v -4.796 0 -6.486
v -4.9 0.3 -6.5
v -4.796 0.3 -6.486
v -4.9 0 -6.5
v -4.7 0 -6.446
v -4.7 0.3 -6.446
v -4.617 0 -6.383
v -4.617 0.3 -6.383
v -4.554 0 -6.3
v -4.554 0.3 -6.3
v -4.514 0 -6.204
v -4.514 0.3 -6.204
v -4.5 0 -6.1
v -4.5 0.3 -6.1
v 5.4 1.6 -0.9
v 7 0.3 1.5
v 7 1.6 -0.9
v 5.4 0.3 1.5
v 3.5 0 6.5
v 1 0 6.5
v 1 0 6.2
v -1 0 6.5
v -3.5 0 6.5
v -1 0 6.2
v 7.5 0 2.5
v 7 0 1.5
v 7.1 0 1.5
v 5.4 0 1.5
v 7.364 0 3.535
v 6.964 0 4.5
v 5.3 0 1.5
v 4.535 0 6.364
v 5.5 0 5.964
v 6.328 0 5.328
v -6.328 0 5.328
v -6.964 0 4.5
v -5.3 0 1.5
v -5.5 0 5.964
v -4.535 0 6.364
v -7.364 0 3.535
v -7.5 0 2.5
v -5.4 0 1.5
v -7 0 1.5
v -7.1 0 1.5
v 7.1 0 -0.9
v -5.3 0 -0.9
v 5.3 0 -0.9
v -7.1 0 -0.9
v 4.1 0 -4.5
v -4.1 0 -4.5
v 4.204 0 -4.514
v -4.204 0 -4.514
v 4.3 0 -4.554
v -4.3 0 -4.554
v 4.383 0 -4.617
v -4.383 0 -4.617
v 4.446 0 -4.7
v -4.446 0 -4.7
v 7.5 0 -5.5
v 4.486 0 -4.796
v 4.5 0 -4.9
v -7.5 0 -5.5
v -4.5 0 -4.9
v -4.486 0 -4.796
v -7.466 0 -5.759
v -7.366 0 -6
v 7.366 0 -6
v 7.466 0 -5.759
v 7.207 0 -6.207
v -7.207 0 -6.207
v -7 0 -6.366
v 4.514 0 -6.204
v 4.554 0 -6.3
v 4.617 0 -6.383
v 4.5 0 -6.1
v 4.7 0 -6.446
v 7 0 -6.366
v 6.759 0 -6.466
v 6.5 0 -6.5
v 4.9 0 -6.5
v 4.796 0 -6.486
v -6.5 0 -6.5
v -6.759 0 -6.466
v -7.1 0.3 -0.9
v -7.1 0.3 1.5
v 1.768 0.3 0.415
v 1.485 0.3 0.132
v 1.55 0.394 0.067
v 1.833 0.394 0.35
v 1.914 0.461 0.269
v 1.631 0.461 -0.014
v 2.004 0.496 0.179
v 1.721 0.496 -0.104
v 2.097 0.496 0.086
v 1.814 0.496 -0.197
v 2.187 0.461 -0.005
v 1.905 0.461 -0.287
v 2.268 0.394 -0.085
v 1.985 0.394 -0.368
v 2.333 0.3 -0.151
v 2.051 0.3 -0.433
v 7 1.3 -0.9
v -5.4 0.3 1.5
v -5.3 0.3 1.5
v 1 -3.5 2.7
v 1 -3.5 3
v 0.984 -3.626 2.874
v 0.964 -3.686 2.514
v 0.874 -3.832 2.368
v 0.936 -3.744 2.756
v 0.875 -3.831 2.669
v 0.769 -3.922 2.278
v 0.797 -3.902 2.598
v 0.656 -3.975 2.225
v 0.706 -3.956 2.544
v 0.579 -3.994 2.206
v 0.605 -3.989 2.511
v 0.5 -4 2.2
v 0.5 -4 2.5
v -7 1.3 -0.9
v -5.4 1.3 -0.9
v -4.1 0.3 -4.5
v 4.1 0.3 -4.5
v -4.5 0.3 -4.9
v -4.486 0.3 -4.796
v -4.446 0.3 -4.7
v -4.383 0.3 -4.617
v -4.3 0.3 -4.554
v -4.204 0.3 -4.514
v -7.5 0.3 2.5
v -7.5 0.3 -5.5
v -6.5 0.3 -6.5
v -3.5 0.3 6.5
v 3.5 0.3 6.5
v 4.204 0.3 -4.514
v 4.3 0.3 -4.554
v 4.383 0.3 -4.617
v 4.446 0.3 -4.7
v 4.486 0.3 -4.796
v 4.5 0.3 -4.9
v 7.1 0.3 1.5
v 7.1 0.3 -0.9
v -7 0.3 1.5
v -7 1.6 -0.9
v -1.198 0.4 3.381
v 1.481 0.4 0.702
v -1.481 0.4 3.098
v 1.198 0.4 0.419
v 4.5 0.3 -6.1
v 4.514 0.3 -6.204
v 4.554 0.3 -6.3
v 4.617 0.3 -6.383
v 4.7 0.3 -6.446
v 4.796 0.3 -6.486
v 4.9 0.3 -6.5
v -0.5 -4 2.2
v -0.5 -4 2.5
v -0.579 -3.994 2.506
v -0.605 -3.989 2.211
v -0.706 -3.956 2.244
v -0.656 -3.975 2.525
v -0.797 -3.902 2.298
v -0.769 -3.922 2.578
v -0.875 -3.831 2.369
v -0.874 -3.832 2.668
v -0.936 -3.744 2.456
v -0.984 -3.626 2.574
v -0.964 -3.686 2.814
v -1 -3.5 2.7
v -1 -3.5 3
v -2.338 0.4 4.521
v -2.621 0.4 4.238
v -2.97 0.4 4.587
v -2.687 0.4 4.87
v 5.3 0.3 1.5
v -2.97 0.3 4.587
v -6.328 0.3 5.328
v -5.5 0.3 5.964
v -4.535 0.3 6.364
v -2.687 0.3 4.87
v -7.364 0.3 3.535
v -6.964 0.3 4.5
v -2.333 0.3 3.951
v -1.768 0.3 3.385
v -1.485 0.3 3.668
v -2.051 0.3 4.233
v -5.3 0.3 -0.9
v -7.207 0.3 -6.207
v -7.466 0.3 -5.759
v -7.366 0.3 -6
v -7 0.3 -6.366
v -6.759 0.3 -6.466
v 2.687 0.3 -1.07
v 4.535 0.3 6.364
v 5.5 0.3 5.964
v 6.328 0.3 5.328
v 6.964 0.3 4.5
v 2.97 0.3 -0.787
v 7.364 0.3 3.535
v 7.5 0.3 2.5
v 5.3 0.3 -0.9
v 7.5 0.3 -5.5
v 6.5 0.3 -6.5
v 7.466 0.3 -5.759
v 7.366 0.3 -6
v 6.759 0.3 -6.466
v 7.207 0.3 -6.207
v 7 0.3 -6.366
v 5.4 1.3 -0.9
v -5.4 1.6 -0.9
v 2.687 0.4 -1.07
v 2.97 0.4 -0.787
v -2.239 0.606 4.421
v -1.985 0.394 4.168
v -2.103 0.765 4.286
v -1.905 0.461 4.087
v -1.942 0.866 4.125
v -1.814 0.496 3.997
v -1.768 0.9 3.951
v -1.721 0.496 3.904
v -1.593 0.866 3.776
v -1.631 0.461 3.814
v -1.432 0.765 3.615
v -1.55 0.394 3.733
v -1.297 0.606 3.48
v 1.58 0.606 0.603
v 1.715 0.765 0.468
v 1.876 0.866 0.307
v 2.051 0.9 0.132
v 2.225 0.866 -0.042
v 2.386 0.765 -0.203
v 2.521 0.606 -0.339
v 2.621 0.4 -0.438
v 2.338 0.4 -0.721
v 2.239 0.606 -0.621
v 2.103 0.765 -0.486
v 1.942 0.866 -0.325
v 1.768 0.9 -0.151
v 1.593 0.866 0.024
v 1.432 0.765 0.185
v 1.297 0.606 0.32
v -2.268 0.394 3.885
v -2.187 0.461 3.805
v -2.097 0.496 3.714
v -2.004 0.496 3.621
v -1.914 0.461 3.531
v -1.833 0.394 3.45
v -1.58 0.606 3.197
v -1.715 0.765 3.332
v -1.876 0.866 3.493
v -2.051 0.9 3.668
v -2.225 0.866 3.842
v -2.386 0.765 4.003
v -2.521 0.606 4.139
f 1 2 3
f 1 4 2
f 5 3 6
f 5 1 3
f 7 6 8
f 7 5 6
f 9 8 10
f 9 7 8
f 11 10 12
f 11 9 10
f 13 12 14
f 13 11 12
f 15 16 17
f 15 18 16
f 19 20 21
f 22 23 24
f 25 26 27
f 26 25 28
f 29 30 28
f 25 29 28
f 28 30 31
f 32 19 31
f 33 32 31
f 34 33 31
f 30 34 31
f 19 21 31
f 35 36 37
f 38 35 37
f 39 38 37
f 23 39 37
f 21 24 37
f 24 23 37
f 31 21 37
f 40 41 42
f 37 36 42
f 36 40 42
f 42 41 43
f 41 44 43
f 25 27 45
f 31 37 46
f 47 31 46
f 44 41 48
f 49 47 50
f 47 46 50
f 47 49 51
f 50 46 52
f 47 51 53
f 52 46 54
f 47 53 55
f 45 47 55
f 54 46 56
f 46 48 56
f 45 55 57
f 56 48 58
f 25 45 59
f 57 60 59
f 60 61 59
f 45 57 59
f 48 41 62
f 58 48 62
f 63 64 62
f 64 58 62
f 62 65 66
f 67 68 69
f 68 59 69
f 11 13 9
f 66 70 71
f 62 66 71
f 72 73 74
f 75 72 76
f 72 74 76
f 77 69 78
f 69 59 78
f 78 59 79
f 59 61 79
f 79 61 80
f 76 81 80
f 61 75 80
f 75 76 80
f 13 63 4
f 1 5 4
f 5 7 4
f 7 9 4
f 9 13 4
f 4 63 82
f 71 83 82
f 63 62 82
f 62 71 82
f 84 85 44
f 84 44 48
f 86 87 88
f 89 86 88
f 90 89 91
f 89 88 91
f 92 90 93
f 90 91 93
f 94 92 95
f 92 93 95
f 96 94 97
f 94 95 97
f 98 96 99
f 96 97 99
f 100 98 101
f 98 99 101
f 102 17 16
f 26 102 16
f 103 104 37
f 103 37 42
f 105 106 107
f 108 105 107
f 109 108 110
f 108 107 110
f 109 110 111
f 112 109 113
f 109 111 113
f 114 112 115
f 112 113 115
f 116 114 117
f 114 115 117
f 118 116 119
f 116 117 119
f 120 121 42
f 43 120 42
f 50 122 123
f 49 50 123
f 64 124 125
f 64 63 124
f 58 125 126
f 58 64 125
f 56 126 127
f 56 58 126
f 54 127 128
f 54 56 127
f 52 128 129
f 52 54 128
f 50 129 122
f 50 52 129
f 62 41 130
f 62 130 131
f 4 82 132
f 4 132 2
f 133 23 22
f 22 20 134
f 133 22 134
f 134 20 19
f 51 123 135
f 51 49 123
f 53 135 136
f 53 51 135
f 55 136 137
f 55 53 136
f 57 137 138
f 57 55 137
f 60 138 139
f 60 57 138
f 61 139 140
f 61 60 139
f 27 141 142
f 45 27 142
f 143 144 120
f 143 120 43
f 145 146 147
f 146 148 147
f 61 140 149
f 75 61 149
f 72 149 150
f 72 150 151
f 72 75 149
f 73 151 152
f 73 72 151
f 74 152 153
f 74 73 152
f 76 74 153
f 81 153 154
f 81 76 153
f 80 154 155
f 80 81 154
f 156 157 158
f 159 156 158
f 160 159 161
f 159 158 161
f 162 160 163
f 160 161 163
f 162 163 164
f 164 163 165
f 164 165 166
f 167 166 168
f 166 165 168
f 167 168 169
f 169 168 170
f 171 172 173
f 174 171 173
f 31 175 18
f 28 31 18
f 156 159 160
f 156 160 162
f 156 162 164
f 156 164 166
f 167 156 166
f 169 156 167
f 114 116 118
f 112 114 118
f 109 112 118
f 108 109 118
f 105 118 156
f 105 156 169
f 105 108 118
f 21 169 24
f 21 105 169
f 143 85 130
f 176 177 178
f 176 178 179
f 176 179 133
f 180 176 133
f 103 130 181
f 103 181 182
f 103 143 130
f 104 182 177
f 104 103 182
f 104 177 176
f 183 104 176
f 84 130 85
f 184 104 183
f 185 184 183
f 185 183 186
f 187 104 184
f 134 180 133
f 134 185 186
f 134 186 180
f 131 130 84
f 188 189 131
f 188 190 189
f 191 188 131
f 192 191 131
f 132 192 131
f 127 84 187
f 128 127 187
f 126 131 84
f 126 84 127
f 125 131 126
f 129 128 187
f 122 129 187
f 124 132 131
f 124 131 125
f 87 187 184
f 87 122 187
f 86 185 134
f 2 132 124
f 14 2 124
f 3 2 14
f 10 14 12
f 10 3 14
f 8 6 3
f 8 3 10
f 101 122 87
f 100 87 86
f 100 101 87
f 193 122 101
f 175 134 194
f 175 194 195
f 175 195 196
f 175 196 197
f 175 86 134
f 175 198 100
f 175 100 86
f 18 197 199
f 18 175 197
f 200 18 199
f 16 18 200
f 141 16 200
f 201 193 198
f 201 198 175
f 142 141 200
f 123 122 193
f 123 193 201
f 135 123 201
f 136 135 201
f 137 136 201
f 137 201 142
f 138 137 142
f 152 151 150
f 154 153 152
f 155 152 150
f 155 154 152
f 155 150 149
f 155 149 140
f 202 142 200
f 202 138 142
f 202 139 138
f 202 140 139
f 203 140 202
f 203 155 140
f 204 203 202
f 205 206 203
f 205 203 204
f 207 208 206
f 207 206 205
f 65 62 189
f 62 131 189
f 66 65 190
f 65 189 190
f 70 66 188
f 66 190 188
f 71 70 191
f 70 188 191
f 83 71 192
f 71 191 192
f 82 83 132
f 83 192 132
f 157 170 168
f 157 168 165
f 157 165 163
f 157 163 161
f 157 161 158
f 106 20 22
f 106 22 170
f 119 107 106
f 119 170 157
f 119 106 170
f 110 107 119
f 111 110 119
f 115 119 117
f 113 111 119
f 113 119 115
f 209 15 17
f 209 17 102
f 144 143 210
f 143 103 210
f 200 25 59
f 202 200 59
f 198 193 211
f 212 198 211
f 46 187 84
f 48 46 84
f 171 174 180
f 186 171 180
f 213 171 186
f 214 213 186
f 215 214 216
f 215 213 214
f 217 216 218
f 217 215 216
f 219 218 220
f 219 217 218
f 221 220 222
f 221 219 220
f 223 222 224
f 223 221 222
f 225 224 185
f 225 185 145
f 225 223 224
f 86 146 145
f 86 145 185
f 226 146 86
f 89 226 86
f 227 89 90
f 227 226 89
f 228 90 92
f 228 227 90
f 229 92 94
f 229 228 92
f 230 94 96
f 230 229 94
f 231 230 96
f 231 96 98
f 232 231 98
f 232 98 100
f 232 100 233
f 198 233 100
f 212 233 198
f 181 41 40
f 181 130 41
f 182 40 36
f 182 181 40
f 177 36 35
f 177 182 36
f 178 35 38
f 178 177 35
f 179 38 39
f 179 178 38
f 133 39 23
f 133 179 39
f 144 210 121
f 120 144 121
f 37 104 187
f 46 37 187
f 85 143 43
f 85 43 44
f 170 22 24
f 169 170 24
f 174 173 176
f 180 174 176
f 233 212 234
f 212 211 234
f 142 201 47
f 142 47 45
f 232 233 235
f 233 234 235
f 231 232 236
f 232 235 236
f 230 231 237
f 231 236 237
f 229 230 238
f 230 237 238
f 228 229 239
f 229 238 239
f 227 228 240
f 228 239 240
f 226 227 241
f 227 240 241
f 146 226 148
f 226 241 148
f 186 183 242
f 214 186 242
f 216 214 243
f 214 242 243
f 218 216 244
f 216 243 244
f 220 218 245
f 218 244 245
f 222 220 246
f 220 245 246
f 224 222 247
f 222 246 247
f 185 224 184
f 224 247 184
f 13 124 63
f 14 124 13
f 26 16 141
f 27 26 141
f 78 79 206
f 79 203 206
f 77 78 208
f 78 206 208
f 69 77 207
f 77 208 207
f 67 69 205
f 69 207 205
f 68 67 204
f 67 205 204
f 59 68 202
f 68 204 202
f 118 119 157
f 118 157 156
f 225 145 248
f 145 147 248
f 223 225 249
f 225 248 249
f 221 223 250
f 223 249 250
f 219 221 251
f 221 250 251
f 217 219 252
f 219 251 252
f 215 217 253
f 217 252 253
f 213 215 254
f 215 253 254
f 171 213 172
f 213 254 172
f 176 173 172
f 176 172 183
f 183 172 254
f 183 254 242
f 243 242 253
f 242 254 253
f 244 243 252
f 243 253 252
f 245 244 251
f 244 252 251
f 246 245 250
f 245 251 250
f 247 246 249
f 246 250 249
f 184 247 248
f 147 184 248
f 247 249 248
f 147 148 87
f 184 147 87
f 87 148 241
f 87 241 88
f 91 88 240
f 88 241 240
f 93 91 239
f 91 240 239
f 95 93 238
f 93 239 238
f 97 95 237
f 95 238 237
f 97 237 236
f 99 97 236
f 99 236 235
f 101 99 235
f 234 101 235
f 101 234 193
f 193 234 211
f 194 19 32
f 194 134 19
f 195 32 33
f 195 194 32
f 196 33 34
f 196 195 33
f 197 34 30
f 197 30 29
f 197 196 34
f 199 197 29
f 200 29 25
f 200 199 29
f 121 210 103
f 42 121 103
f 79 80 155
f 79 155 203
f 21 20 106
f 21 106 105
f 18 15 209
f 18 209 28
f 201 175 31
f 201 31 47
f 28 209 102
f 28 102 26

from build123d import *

# Parameters (mm, degrees)
SKETCH1_W               = 15
SKETCH1_H               = 13
BASE_DEPTH              = 0.3
SKETCH7_W               = 1.8
SKETCH7_H               = 2.4
LOCKING_CLAMP_CUT_DEPTH = 10.92924972
LOCKING_CLAMP_DEPTH     = 0.8
SPRING_CLASP_DEPTH      = 0.2
WIRE_CONNECTION_DEPTH   = 1
SKETCH14_W              = 9
SKETCH14_H              = 2
BOTTOM_SLOT_CUT_DEPTH   = 11.816191566
TS_F_R                  = 1
BS_F_R                  = 4
WC_F_R                  = 0.5
BSC_F_R                 = 0.4


with BuildPart() as part:
    # Sketch1 → BASE (new body)
    with BuildSketch(Plane(origin=(0, 0, 0), x_dir=(1, 0, 0), z_dir=(0, 1, 0))):
        Rectangle(SKETCH1_W, SKETCH1_H)
    extrude(amount=BASE_DEPTH)

    # Sketch7 → LOCKING CLAMP CUT (cut, through all)
    with BuildSketch(Plane(origin=(0, 0.3, 0), x_dir=(1, 0, 0), z_dir=(0, 1, 0))):
        with Locations((6.2, -0.3)):
            Rectangle(SKETCH7_W, SKETCH7_H)
    locking_clamp_cut = extrude(amount=-LOCKING_CLAMP_CUT_DEPTH, mode=Mode.SUBTRACT)

    # Sketch9 → LOCKING CLAMP (add, symmetric)
    with BuildSketch(Plane.ZY.offset(-6.2)):
        Polygon((1.5, 0.3), (-0.9, 1.6), (-0.9, 1.3), (1.5, 0), align=None)
    locking_clamp = extrude(amount=LOCKING_CLAMP_DEPTH, both=True)

    # LC M: LOCKING CLAMP CUT, LOCKING CLAMP across plane
    add(locking_clamp_cut.mirror(Plane(origin=(0, 0, 0), x_dir=(0, 0, 1), z_dir=(1, 0, 0))), mode=Mode.SUBTRACT)
    add(locking_clamp.mirror(Plane(origin=(0, 0, 0), x_dir=(0, 0, 1), z_dir=(1, 0, 0))))

    # Sketch11 → SPRING CLASP (add, symmetric)
    with BuildSketch(Plane(origin=(0.95, 0, 0.95), x_dir=(-0.7071067811865436, 0, 0.7071067811865516), z_dir=(-0.7071067811865516, 0, -0.7071067811865436))):
        with BuildLine():
            Line((5.343502884, 0), (4.635110863, 0))
            ThreePointArc((4.635110863, 0), (4.57056114, 0.023623738), (4.536509533, 0.083333333))
            ThreePointArc((4.536509533, 0.083333333), (4.043502884, 0.5), (3.550496236, 0.083333333))
            ThreePointArc((3.550496236, 0.083333333), (3.516444628, 0.023623738), (3.451894906, 0))
            Line((3.451894906, 0), (-0.764889137, 0))
            ThreePointArc((-0.764889137, 0), (-0.82943886, 0.023623738), (-0.863490467, 0.083333333))
            ThreePointArc((-0.863490467, 0.083333333), (-1.356497116, 0.5), (-1.849503764, 0.083333333))
            ThreePointArc((-1.849503764, 0.083333333), (-1.883555372, 0.023623738), (-1.948105094, 0))
            Line((-1.948105094, 0), (-2.656497116, 0))
            Line((-2.656497116, 0), (-2.656497116, 0.4))
            Line((-2.656497116, 0.4), (-2.162722891, 0.4))
            ThreePointArc((-2.162722891, 0.4), (-1.356497116, 0.9), (-0.550271341, 0.4))
            Line((-0.550271341, 0.4), (3.237277109, 0.4))
            ThreePointArc((3.237277109, 0.4), (4.043502884, 0.9), (4.849728659, 0.4))
            Line((4.849728659, 0.4), (5.343502884, 0.4))
            Line((5.343502884, 0.4), (5.343502884, 0))
        make_face()
    extrude(amount=SPRING_CLASP_DEPTH, both=True)

    # Sketch13 → WIRE CONNECTION (add, symmetric)
    with BuildSketch(Plane(origin=(0, 0, 0), x_dir=(0, 0, -1), z_dir=(1, 0, 0))):
        Polygon((-6.5, 0), (-2.5, -4), (-2.2, -4), (-6.2, 0), align=None)
    extrude(amount=WIRE_CONNECTION_DEPTH, both=True)

    # Sketch14 → BOTTOM SLOT CUT (cut, through all)
    with BuildSketch(Plane(origin=(0, 0.3, 0), x_dir=(1, 0, 0), z_dir=(0, 1, 0))):
        with Locations((0, 5.5)):
            Rectangle(SKETCH14_W, SKETCH14_H)
    extrude(amount=-BOTTOM_SLOT_CUT_DEPTH, mode=Mode.SUBTRACT)

    # TS F
    ts_f_edges = [part.edges().sort_by_distance(p)[0] for p in [
        (-7.5, 0.15, -6.5),
        (7.5, 0.15, -6.5),
    ]]
    fillet(ts_f_edges, radius=TS_F_R)

    # BS F
    bs_f_edges = [part.edges().sort_by_distance(p)[0] for p in [
        (7.5, 0.15, 6.5),
        (-7.5, 0.15, 6.5),
    ]]
    fillet(bs_f_edges, radius=BS_F_R)

    # WC F
    # the kernel refuses this fillet: 0.5 mm, written as the material it takes off along each edge
    with BuildSketch(Plane(origin=(-1, -4, 3.75), x_dir=(0, 1, 0), z_dir=(0, 0, -1))) as wc_f_piece_1:
        with BuildLine():
            CenterArc((WC_F_R, WC_F_R), WC_F_R, 180, 90)
            Line((0, WC_F_R), (0, 0))
            Line((0, 0), (WC_F_R, 0))
        make_face()
    extrude(amount=2.8, mode=Mode.SUBTRACT)
    with BuildSketch(Plane(origin=(1, -4, 3.75), x_dir=(0, 1, 0), z_dir=(0, 0, -1))) as wc_f_piece_2:
        with BuildLine():
            CenterArc((WC_F_R, -WC_F_R), WC_F_R, 90, 90)
            Line((0, -WC_F_R), (0, 0))
            Line((0, 0), (WC_F_R, 0))
        make_face()
    extrude(amount=2.8, mode=Mode.SUBTRACT)

    # BSC F
    bsc_f_edges = [part.edges().sort_by_distance(p)[0] for p in [
        (4.5, 0.15, -6.5),
        (-4.5, 0.15, -6.5),
        (4.5, 0.15, -4.5),
        (-4.5, 0.15, -4.5),
    ]]
    fillet(bsc_f_edges, radius=BSC_F_R)


solid = part.part
